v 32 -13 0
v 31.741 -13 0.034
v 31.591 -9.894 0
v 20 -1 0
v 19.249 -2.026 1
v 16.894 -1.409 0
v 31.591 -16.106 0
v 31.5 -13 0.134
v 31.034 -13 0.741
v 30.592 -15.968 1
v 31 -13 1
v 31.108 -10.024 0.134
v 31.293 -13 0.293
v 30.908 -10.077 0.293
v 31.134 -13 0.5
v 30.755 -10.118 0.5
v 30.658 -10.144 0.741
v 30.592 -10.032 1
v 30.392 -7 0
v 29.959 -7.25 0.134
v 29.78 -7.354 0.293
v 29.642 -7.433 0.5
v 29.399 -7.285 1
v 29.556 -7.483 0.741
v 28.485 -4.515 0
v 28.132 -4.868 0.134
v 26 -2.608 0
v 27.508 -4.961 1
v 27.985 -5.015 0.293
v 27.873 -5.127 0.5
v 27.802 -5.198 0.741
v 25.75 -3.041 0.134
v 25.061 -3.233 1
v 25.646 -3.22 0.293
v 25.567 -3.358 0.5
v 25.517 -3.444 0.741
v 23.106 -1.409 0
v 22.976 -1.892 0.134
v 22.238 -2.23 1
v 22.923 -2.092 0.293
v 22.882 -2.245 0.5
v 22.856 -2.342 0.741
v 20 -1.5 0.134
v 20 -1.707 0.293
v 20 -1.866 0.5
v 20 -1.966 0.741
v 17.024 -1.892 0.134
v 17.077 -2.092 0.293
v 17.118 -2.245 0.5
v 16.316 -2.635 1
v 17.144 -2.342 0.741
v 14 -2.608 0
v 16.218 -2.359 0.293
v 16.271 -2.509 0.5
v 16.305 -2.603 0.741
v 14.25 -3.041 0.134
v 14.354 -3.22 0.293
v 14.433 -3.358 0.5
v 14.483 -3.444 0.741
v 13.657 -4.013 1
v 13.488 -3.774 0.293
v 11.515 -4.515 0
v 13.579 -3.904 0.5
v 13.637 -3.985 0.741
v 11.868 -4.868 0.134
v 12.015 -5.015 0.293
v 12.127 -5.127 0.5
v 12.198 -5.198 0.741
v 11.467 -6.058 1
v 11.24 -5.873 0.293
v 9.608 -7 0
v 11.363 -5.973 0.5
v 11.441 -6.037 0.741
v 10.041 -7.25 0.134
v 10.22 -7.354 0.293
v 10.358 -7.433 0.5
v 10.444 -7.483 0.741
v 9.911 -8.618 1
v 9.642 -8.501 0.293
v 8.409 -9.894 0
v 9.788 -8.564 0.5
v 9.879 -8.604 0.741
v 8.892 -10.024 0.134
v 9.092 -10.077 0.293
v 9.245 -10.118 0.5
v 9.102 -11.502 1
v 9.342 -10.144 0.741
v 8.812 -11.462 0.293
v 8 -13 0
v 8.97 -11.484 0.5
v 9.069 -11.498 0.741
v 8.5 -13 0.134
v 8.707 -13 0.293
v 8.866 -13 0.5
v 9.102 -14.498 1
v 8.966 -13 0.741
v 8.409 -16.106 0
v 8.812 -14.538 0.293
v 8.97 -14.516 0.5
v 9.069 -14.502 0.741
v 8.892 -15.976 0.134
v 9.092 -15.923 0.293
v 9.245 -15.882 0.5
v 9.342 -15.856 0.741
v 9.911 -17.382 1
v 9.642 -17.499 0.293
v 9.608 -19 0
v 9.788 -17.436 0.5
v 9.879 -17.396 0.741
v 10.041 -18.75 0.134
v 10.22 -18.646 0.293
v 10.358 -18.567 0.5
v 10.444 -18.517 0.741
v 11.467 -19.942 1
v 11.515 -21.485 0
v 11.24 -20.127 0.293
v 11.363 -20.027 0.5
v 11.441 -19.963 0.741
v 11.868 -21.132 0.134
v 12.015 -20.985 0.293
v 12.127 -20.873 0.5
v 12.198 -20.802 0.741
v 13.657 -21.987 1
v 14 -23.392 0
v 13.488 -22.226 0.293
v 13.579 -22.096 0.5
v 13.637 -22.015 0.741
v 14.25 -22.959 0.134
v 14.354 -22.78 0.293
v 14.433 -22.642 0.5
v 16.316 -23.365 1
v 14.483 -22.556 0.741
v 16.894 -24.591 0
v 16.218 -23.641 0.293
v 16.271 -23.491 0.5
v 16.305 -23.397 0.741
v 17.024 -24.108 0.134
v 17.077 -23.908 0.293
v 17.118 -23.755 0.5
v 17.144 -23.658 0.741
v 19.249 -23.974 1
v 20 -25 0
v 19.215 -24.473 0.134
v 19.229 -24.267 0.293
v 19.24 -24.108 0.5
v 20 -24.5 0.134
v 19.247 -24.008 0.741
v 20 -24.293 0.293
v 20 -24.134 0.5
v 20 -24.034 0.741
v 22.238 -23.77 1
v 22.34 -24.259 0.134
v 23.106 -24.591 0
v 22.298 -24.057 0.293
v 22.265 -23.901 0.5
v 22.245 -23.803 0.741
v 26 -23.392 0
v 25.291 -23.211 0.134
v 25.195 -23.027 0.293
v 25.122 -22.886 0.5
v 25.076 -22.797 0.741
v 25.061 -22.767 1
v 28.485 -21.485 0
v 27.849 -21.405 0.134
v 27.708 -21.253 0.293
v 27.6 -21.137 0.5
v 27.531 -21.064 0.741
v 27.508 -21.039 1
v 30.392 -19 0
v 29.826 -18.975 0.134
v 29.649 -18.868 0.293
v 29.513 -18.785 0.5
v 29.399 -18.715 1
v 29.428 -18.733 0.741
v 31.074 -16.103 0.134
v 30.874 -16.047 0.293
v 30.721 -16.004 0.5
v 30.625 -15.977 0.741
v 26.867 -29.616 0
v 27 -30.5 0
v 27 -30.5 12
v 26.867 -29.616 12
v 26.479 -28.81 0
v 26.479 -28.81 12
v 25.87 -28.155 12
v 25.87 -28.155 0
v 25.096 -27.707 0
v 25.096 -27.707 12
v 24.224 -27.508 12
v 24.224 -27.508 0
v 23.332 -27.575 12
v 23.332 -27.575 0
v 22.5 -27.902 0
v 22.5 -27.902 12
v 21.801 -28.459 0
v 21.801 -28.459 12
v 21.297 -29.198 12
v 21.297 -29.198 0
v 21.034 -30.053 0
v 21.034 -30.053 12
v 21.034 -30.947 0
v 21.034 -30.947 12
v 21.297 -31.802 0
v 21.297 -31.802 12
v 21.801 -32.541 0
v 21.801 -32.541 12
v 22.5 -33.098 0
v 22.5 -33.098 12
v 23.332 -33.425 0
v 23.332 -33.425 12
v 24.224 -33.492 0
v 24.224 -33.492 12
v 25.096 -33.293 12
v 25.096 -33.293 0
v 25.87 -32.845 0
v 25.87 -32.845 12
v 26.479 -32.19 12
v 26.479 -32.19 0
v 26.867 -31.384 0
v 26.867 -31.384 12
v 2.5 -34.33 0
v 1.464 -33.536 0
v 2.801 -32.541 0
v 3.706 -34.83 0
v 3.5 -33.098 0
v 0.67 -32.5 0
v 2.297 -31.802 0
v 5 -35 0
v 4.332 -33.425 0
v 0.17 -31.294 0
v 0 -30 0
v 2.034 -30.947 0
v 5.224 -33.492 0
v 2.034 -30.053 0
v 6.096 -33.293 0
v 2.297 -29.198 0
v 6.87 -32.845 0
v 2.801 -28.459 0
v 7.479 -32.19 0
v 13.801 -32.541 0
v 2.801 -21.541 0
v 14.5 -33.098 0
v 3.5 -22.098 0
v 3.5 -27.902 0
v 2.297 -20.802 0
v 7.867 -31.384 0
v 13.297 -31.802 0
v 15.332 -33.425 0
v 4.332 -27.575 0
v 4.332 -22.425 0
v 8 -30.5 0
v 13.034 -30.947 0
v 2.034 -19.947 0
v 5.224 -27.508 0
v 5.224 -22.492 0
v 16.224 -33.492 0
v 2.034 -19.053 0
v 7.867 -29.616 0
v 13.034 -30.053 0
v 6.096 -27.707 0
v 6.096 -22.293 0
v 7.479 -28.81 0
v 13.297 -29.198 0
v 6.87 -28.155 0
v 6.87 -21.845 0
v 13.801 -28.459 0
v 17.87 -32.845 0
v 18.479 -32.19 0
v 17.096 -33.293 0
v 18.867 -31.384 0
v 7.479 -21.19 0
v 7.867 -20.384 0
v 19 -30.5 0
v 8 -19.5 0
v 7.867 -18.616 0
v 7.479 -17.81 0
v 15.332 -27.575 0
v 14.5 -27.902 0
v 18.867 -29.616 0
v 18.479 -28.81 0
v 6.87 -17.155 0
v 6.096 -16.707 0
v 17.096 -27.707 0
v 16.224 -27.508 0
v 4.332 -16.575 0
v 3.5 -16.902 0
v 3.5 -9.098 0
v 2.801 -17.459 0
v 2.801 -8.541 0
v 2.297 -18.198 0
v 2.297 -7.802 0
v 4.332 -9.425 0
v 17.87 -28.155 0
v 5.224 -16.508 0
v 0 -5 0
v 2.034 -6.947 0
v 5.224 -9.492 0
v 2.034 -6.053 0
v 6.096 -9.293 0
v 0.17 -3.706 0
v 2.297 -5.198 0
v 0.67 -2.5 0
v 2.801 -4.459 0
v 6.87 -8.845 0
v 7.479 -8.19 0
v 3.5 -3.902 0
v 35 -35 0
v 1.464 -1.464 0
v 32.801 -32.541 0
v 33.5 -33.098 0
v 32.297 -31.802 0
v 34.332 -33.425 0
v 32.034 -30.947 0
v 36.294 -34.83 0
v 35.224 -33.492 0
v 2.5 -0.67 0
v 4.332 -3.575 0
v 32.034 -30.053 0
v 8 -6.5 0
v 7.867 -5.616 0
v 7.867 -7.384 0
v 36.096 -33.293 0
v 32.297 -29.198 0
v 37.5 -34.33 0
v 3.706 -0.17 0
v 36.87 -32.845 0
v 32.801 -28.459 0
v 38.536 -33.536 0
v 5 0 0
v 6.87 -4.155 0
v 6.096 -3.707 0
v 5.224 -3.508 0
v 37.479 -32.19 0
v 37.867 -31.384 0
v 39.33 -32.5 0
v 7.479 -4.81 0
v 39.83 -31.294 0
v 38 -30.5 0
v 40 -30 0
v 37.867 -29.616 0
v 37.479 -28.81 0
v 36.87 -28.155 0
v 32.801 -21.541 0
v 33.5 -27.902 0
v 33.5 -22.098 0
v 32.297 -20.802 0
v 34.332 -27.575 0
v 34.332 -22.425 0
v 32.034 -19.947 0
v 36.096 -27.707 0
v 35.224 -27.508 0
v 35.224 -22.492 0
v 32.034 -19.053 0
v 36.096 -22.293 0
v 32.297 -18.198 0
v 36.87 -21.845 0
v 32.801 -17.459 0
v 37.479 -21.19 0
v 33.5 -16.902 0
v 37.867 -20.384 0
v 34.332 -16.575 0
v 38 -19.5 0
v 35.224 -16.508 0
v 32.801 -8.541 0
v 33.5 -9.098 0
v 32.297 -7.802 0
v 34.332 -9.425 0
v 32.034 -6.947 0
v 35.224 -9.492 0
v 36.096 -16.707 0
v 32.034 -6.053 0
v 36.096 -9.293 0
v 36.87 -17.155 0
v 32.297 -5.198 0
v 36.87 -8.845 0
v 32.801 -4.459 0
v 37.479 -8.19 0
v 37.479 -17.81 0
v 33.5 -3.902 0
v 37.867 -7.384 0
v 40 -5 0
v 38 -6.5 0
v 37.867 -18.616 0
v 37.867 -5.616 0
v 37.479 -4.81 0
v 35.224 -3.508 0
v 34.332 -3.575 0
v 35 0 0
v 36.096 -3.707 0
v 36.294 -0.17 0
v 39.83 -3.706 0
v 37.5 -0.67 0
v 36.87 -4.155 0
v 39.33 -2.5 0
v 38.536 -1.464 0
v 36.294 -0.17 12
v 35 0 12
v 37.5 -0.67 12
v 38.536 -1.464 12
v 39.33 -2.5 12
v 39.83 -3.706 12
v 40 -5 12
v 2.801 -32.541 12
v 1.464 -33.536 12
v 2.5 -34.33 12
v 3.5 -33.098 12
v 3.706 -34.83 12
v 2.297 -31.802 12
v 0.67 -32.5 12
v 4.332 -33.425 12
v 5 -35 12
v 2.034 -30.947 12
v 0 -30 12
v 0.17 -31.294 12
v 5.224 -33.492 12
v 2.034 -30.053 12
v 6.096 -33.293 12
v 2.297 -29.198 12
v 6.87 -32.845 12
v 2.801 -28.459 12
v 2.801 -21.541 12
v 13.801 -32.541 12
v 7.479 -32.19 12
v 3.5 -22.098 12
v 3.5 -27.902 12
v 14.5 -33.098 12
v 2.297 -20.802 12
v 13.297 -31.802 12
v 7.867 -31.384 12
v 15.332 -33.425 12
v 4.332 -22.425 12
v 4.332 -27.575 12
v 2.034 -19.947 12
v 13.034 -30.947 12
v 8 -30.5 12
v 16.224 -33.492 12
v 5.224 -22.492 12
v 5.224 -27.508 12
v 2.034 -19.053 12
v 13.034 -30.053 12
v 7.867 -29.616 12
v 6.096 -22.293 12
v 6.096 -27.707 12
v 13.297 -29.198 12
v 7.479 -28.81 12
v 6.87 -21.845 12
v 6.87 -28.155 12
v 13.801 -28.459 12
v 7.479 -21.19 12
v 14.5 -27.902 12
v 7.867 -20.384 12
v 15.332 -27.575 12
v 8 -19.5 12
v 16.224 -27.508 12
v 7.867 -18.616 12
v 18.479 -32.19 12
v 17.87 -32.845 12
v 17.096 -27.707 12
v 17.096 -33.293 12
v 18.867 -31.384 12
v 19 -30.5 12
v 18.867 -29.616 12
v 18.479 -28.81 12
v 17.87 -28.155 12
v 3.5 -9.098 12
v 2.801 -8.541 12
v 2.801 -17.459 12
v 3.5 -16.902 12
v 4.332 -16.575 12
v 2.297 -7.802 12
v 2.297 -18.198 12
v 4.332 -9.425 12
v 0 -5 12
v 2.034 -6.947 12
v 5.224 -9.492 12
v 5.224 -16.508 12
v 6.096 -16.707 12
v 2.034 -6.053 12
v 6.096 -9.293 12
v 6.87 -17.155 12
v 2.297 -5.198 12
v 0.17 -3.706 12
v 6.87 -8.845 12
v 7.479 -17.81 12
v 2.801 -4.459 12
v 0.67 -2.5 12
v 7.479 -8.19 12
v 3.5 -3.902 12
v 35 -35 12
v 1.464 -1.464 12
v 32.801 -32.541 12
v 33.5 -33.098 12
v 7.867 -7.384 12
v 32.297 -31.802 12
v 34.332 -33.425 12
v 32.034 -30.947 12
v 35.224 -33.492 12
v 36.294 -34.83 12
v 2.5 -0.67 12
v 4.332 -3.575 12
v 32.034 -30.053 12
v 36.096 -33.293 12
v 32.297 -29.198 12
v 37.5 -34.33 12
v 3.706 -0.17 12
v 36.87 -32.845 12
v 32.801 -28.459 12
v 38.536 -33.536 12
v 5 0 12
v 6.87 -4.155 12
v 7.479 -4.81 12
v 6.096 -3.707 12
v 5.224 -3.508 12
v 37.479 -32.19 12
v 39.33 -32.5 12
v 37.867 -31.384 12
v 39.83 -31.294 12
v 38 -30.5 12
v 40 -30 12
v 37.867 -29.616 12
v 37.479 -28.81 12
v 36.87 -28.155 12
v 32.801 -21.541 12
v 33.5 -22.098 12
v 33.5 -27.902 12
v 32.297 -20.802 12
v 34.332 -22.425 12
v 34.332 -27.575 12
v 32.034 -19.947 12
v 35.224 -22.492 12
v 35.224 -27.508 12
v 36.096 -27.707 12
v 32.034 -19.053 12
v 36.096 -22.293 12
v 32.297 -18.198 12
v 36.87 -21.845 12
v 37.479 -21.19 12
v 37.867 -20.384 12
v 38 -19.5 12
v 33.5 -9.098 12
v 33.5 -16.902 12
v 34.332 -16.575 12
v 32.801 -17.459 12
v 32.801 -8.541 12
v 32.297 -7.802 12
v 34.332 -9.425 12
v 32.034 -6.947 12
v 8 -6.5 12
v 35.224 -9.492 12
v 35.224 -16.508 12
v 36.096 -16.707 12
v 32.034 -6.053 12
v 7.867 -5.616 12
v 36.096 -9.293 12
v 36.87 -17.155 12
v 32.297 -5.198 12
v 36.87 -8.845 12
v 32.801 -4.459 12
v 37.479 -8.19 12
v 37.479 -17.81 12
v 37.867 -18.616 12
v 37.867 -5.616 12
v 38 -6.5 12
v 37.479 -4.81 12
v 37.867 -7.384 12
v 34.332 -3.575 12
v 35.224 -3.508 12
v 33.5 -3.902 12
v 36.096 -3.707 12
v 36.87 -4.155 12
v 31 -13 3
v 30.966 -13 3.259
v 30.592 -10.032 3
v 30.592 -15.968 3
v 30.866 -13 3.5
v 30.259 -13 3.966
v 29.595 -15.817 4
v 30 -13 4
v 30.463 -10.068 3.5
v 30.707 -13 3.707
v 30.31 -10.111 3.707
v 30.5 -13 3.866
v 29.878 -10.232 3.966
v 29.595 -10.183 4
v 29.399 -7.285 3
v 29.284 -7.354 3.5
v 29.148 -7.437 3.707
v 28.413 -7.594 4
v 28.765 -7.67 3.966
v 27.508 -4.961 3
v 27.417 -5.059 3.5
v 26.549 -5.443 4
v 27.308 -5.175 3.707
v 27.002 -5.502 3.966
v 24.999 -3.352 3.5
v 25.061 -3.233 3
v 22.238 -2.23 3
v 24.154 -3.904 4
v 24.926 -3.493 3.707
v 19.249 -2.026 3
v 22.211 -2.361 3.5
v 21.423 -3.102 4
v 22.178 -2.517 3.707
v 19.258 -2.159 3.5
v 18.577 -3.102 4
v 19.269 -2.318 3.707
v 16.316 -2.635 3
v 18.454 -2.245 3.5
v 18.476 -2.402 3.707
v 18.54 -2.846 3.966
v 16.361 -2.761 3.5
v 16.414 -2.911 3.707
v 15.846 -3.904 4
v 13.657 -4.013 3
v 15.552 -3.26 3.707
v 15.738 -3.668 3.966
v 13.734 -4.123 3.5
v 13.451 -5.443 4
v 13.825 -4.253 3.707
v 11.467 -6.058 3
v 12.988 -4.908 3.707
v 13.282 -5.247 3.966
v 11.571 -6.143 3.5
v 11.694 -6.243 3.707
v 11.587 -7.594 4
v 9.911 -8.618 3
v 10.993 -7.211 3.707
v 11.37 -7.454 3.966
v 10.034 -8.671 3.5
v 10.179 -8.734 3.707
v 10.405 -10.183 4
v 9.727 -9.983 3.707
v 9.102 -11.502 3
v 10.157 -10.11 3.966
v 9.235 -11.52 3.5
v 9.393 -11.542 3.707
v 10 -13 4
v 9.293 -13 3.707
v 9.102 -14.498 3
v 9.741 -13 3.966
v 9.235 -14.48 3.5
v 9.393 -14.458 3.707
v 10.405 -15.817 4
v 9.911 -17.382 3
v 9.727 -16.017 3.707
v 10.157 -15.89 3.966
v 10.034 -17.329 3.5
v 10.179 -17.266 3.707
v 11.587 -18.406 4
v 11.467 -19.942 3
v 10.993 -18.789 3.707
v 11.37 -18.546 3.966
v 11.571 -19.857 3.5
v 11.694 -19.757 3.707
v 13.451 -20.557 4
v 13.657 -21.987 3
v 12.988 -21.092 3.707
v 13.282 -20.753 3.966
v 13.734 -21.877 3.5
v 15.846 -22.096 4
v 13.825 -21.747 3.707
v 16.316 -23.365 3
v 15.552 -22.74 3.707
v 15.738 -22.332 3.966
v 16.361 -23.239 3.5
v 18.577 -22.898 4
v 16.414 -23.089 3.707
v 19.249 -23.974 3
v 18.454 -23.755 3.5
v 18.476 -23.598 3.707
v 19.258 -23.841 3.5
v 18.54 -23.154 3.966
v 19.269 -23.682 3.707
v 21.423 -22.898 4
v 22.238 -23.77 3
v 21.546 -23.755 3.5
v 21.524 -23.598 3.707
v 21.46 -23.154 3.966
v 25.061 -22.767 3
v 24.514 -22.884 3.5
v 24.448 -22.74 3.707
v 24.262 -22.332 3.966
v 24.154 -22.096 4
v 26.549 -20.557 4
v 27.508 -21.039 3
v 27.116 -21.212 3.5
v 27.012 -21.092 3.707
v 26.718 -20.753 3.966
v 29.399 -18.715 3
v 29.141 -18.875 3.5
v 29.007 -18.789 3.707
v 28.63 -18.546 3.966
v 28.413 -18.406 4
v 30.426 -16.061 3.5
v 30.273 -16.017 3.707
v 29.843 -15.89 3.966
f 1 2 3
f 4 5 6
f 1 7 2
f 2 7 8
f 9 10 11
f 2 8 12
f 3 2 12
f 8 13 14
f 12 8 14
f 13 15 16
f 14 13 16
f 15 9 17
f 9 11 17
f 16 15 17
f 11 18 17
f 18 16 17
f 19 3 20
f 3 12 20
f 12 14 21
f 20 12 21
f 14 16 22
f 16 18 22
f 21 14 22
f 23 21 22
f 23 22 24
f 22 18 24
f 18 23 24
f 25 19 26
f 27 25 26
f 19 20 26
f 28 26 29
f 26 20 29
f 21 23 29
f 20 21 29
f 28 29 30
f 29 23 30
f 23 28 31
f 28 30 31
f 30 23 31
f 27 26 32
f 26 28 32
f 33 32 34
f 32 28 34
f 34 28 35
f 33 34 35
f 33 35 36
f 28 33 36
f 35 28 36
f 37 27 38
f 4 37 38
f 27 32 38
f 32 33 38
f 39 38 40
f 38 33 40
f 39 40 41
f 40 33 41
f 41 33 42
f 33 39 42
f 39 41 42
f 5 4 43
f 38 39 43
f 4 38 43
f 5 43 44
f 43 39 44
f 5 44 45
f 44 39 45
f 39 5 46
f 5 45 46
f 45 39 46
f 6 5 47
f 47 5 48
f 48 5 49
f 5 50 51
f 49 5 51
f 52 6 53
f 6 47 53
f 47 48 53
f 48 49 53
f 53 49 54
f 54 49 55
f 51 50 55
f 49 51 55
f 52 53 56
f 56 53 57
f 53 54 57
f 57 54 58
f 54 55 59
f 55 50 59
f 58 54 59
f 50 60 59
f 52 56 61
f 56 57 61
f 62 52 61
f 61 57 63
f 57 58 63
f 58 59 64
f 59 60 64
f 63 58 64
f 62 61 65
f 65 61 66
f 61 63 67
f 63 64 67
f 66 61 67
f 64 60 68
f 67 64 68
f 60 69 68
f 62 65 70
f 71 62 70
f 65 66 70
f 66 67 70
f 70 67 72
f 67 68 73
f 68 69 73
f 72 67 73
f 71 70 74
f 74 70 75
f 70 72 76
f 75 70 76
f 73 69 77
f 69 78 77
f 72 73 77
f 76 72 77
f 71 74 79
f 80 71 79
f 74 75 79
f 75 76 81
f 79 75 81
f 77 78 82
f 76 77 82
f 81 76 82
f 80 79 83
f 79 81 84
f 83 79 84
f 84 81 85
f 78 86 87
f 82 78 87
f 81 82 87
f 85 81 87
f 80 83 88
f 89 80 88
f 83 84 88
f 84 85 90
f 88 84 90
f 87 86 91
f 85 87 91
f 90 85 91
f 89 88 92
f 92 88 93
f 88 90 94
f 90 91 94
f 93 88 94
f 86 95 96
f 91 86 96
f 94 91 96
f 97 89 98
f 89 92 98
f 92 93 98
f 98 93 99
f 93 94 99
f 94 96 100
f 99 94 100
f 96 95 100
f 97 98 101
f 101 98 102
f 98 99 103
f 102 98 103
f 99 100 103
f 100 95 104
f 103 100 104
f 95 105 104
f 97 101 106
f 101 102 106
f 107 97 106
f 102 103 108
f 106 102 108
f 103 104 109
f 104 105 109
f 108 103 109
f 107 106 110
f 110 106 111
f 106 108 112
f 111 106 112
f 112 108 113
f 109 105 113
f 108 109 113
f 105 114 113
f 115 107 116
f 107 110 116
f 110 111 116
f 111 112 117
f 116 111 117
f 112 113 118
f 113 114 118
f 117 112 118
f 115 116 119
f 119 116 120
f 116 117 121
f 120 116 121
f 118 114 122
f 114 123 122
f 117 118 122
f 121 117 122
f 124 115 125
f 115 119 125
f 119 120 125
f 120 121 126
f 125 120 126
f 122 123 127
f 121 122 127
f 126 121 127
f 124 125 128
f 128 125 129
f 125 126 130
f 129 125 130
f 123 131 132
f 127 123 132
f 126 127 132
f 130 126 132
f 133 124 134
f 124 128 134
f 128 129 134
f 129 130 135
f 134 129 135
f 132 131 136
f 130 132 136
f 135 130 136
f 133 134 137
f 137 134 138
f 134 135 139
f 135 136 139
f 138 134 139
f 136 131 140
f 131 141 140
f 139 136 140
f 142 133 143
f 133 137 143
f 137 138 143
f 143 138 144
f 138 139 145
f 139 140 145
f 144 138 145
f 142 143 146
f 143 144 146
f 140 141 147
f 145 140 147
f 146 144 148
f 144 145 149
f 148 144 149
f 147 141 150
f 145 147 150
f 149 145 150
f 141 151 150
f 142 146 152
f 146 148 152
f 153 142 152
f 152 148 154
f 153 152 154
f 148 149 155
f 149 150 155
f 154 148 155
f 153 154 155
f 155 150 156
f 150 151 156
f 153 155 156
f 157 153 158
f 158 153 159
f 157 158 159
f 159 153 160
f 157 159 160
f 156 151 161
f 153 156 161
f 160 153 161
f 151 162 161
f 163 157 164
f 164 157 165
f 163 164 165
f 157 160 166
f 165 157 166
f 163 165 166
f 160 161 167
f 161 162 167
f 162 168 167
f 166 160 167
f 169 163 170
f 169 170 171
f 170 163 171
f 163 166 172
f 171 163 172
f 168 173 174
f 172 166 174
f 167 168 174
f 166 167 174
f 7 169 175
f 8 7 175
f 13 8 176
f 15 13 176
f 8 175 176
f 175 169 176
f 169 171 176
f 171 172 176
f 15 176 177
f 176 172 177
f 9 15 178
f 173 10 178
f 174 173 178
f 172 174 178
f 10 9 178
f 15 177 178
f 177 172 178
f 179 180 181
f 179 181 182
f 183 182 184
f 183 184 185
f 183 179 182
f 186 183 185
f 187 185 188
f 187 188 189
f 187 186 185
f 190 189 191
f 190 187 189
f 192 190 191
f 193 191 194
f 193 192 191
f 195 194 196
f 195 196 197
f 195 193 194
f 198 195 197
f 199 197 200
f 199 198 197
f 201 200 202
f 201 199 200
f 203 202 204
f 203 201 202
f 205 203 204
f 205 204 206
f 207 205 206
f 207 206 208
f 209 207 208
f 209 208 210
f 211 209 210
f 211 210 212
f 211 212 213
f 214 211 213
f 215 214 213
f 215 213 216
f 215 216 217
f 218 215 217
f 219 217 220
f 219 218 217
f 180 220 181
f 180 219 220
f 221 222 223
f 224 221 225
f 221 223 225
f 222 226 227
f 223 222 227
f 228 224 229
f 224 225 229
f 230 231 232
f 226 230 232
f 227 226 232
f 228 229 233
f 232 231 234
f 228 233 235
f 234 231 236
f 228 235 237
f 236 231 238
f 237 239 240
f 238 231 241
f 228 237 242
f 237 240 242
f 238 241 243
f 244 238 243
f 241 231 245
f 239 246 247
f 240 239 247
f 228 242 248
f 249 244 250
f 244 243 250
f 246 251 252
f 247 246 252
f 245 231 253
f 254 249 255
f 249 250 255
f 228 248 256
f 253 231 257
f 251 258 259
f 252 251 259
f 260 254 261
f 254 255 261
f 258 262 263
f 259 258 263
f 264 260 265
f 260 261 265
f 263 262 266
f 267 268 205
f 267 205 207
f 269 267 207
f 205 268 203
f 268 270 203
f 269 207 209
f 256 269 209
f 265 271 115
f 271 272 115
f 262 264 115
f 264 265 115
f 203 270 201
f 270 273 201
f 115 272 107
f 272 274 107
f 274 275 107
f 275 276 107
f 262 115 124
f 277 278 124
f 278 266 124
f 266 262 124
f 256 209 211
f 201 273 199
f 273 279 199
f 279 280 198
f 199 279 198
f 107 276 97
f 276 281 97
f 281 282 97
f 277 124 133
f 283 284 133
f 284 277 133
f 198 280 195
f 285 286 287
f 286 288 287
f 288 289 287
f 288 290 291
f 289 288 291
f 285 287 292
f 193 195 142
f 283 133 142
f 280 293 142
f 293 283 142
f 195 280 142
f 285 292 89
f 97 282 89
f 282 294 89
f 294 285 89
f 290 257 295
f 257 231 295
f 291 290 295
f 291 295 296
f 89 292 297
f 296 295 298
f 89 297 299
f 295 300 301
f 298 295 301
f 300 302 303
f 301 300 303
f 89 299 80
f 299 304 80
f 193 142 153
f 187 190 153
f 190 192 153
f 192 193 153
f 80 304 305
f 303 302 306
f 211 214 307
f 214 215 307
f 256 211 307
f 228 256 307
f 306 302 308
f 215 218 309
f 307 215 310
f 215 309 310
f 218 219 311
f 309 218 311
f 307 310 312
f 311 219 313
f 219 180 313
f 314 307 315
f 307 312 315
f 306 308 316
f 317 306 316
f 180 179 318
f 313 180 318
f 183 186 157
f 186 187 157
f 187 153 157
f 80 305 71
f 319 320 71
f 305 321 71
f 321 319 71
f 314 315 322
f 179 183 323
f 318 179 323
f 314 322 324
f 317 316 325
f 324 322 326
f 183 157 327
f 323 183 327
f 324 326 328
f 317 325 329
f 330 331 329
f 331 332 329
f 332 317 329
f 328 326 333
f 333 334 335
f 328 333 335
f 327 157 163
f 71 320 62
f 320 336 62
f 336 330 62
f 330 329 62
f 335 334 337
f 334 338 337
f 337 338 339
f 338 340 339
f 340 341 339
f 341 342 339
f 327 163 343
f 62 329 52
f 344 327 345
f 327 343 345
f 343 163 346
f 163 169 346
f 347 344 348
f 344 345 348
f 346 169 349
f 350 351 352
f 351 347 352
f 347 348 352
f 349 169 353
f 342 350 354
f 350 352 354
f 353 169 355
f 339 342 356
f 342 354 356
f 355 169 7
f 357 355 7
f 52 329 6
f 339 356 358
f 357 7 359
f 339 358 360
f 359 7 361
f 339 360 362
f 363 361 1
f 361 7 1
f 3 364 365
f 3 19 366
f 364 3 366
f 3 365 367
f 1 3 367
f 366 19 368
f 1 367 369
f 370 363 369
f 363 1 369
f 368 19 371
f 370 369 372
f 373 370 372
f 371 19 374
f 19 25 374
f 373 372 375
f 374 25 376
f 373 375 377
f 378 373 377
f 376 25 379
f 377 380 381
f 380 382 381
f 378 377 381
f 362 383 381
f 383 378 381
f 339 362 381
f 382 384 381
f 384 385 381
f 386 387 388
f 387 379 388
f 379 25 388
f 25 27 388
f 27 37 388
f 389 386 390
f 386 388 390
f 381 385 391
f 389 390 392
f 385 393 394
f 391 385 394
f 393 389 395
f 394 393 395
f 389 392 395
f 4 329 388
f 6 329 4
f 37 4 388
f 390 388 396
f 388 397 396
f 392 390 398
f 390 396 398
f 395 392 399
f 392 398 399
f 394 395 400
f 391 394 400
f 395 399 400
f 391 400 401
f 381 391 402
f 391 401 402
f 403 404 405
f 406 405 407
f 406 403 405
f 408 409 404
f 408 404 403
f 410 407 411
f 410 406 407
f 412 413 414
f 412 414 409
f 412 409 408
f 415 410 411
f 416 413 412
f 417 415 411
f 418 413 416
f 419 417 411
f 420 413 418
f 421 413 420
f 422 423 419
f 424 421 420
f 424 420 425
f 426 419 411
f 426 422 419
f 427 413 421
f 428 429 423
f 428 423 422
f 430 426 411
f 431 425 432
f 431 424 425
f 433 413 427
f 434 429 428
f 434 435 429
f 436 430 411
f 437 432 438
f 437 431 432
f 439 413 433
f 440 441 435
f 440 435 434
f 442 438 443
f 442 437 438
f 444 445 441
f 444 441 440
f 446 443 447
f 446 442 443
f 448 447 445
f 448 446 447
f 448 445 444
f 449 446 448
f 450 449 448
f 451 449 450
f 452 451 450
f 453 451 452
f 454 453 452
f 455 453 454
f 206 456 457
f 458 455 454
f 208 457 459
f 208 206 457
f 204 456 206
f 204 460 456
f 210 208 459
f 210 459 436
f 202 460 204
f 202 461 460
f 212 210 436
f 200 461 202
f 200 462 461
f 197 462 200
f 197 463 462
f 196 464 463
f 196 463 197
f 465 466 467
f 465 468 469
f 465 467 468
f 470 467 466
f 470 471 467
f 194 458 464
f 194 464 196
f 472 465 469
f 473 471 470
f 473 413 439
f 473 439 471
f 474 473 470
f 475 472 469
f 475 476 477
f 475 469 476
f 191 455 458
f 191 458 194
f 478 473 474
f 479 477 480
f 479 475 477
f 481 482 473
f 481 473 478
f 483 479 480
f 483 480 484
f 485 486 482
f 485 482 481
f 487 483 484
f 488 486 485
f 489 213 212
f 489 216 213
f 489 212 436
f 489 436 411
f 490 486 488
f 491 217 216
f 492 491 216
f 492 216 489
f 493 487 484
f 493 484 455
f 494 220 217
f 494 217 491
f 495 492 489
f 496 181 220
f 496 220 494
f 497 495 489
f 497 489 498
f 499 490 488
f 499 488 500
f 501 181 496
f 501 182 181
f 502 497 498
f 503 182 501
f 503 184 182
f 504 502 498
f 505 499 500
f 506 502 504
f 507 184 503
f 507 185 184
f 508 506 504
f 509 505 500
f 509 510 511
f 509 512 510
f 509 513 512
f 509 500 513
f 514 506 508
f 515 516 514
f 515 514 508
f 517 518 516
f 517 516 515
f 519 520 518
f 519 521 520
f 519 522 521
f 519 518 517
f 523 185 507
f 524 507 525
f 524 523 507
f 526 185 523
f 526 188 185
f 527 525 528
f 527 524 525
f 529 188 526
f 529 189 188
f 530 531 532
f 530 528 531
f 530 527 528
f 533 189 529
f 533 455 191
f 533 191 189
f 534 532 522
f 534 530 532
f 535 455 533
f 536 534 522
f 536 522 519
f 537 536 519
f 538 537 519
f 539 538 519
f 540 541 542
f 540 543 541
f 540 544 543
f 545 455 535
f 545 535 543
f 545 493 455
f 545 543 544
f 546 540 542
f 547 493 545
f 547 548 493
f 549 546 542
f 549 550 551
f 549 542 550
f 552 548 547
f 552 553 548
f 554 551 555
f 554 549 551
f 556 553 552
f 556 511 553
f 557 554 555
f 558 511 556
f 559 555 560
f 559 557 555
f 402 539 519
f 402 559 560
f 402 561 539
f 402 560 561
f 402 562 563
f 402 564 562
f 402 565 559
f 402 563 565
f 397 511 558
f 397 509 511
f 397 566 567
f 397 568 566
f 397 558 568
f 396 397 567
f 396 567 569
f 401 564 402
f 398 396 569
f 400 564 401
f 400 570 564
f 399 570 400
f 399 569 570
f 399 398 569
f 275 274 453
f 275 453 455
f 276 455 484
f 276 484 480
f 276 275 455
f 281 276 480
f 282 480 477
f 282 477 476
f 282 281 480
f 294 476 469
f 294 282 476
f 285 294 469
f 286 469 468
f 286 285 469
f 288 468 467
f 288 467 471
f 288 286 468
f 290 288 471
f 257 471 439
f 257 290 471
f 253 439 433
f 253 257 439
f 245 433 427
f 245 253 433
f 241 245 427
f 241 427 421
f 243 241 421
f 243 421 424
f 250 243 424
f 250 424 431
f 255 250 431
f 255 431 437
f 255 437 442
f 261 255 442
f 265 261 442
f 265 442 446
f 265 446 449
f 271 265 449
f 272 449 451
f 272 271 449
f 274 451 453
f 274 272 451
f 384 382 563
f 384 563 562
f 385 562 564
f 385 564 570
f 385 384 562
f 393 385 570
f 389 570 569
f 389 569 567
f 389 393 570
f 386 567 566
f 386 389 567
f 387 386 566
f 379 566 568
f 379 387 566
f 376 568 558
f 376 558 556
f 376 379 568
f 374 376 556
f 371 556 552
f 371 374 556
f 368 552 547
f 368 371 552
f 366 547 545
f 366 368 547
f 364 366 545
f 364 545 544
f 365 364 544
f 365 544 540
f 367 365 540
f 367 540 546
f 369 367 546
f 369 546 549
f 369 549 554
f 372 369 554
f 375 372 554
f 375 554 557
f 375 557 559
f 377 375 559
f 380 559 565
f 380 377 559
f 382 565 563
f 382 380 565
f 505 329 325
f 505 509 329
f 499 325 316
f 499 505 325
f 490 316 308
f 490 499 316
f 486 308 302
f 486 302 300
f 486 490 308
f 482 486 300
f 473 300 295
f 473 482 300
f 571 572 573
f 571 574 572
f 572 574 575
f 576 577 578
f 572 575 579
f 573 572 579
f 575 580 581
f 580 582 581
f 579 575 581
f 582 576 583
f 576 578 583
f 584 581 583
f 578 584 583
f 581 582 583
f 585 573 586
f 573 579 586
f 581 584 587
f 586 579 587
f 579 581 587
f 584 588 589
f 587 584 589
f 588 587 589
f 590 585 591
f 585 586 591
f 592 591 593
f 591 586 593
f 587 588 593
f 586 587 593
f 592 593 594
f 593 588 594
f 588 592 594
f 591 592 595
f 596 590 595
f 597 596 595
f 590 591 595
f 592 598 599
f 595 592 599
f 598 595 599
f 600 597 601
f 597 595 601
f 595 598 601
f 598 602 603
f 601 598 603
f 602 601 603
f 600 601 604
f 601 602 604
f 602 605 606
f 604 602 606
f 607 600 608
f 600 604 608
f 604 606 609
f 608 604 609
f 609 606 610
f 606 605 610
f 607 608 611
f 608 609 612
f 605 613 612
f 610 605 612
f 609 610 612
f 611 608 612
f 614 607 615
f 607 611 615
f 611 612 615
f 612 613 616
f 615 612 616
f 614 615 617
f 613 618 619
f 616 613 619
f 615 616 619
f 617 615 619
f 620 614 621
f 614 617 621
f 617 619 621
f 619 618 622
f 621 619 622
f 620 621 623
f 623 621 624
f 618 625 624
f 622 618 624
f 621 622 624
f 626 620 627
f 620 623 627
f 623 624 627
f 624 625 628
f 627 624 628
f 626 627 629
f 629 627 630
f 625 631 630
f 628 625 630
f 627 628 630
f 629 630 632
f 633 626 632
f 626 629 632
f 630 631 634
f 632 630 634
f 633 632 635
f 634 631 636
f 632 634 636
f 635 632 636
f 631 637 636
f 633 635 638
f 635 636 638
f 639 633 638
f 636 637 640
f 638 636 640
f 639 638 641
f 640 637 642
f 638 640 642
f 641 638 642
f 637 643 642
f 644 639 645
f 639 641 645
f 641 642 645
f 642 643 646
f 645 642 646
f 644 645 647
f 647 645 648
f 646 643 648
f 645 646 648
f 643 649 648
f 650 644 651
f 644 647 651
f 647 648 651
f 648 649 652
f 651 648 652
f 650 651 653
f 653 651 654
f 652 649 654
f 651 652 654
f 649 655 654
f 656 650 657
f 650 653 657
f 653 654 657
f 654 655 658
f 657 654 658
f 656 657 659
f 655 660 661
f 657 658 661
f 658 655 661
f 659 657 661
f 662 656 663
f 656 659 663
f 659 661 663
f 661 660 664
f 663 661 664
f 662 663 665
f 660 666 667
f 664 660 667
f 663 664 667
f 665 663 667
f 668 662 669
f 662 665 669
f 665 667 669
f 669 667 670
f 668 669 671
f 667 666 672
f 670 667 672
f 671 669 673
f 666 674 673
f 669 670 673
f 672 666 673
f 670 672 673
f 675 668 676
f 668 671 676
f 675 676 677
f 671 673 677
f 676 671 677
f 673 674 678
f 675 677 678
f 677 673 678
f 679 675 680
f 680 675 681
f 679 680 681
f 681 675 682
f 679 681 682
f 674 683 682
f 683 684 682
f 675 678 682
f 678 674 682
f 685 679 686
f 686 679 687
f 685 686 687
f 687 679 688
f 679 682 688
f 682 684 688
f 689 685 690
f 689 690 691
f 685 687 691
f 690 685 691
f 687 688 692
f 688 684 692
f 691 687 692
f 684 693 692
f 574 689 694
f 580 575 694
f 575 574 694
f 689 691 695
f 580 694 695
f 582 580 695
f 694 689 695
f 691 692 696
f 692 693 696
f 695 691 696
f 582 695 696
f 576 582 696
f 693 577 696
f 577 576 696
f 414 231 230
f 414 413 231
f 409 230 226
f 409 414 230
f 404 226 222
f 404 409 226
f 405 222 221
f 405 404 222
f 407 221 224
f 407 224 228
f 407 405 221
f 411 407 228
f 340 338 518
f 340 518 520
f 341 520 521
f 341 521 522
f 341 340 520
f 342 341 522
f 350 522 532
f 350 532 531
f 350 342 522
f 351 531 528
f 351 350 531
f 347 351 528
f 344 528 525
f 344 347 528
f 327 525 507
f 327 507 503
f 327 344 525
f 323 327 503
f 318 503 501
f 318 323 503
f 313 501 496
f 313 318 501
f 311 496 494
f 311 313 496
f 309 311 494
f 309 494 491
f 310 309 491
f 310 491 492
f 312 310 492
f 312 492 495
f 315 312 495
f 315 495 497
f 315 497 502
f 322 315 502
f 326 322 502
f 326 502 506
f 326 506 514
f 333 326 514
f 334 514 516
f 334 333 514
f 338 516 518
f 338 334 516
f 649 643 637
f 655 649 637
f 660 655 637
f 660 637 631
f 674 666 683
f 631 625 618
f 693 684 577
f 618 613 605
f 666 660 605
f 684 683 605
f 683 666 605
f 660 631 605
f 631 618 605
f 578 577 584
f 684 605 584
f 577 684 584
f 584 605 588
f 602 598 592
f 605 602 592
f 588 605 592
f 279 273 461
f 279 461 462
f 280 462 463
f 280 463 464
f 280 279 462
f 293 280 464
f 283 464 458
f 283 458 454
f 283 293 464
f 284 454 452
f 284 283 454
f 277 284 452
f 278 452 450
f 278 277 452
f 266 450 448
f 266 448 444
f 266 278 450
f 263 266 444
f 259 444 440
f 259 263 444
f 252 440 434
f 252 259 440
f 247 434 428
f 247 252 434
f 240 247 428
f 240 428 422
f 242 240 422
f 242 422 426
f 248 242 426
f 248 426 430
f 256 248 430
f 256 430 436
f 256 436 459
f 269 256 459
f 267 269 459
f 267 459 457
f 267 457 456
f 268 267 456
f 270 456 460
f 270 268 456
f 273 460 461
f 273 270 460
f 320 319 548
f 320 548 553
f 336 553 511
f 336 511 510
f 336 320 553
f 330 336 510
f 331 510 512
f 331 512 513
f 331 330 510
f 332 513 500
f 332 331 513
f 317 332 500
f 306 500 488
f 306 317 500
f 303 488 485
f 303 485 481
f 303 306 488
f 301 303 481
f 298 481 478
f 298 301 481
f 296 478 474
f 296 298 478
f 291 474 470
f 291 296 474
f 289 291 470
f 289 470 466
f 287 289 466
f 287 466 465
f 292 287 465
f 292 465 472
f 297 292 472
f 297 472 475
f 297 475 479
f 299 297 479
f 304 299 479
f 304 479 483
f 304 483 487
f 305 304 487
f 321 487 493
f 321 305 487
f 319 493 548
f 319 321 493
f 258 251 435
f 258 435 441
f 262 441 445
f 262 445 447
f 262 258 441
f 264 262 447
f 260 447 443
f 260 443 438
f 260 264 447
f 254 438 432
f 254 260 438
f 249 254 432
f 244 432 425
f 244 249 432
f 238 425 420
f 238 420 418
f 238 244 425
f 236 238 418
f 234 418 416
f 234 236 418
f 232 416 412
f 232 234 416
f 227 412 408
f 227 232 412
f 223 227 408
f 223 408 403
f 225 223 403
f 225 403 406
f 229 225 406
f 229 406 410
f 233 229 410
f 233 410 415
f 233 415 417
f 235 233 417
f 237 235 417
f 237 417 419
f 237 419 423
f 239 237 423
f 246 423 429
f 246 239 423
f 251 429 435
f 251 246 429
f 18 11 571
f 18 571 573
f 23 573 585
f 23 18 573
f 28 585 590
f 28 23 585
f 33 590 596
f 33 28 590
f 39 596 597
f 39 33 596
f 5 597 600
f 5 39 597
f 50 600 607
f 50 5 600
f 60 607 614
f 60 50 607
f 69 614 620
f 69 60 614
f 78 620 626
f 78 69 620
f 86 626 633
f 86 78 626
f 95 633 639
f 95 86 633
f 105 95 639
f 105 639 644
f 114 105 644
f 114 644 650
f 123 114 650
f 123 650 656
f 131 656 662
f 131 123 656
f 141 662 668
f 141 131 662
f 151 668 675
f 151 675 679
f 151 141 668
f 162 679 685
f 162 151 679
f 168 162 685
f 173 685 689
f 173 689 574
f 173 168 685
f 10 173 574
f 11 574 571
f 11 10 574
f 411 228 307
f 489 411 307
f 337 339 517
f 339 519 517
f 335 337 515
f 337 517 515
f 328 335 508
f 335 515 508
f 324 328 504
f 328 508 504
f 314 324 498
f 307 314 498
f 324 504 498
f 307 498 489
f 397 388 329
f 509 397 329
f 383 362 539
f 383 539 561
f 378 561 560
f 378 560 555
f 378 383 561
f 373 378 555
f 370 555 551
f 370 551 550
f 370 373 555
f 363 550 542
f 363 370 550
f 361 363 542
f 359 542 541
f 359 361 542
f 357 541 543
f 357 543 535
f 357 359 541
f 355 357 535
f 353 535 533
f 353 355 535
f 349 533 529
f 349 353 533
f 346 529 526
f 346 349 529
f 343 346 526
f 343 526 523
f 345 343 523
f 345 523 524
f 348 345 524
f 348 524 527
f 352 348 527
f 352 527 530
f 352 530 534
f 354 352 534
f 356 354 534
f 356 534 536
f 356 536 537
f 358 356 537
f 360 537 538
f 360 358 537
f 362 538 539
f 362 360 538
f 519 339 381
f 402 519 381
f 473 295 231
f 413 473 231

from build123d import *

# Parameters (mm, degrees)
F0_R     = 3
F0_R_2   = 11
F0_W     = 40
F0_H     = 9
F1_DEPTH = 12
F2_DEPTH = 4
F3_R     = 5
F4_R     = 1


with BuildPart() as f1:
    # F0 (on Top) → F1 (new body)
    with BuildSketch(Plane.XY):
        Polygon((40, 0), (0, 0), (0, -13), (0, -26), (40, -26), (40, -13), align=None)
        with Locations((5, -19.5)):
            Circle(F0_R, mode=Mode.SUBTRACT)
        with Locations((35, -19.5)):
            Circle(F0_R, mode=Mode.SUBTRACT)
        with Locations((5, -6.5)):
            Circle(F0_R, mode=Mode.SUBTRACT)
        with Locations((20, -13)):
            Circle(F0_R_2, mode=Mode.SUBTRACT)
        with Locations((35, -6.5)):
            Circle(F0_R, mode=Mode.SUBTRACT)
        with Locations((20, -13)):
            Circle(F0_R_2)
        with Locations((20, -30.5)):
            Rectangle(F0_W, F0_H)
        with Locations((5, -30.5)):
            Circle(F0_R, mode=Mode.SUBTRACT)
        with Locations((16, -30.5)):
            Circle(F0_R, mode=Mode.SUBTRACT)
        with Locations((24, -30.5)):
            Circle(F0_R, mode=Mode.SUBTRACT)
        with Locations((35, -30.5)):
            Circle(F0_R, mode=Mode.SUBTRACT)
    extrude(amount=F1_DEPTH)

    # F0 (on Top) → F2 (cut)
    with BuildSketch(Plane.XY):
        with Locations((20, -13)):
            Circle(F0_R_2)
    extrude(amount=F2_DEPTH, mode=Mode.SUBTRACT)

    # F3
    f3_edges = [f1.edges().sort_by_distance(p)[0] for p in [
        (40, -35, 6),
        (0, -35, 6),
        (0, 0, 6),
        (40, 0, 6),
    ]]
    fillet(f3_edges, radius=F3_R)

    # F4
    f4_edges = [f1.edges().sort_by_distance(p)[0] for p in [
        (9, -13, 4),
        (9, -13, 0),
    ]]
    fillet(f4_edges, radius=F4_R)


solid = f1.part
